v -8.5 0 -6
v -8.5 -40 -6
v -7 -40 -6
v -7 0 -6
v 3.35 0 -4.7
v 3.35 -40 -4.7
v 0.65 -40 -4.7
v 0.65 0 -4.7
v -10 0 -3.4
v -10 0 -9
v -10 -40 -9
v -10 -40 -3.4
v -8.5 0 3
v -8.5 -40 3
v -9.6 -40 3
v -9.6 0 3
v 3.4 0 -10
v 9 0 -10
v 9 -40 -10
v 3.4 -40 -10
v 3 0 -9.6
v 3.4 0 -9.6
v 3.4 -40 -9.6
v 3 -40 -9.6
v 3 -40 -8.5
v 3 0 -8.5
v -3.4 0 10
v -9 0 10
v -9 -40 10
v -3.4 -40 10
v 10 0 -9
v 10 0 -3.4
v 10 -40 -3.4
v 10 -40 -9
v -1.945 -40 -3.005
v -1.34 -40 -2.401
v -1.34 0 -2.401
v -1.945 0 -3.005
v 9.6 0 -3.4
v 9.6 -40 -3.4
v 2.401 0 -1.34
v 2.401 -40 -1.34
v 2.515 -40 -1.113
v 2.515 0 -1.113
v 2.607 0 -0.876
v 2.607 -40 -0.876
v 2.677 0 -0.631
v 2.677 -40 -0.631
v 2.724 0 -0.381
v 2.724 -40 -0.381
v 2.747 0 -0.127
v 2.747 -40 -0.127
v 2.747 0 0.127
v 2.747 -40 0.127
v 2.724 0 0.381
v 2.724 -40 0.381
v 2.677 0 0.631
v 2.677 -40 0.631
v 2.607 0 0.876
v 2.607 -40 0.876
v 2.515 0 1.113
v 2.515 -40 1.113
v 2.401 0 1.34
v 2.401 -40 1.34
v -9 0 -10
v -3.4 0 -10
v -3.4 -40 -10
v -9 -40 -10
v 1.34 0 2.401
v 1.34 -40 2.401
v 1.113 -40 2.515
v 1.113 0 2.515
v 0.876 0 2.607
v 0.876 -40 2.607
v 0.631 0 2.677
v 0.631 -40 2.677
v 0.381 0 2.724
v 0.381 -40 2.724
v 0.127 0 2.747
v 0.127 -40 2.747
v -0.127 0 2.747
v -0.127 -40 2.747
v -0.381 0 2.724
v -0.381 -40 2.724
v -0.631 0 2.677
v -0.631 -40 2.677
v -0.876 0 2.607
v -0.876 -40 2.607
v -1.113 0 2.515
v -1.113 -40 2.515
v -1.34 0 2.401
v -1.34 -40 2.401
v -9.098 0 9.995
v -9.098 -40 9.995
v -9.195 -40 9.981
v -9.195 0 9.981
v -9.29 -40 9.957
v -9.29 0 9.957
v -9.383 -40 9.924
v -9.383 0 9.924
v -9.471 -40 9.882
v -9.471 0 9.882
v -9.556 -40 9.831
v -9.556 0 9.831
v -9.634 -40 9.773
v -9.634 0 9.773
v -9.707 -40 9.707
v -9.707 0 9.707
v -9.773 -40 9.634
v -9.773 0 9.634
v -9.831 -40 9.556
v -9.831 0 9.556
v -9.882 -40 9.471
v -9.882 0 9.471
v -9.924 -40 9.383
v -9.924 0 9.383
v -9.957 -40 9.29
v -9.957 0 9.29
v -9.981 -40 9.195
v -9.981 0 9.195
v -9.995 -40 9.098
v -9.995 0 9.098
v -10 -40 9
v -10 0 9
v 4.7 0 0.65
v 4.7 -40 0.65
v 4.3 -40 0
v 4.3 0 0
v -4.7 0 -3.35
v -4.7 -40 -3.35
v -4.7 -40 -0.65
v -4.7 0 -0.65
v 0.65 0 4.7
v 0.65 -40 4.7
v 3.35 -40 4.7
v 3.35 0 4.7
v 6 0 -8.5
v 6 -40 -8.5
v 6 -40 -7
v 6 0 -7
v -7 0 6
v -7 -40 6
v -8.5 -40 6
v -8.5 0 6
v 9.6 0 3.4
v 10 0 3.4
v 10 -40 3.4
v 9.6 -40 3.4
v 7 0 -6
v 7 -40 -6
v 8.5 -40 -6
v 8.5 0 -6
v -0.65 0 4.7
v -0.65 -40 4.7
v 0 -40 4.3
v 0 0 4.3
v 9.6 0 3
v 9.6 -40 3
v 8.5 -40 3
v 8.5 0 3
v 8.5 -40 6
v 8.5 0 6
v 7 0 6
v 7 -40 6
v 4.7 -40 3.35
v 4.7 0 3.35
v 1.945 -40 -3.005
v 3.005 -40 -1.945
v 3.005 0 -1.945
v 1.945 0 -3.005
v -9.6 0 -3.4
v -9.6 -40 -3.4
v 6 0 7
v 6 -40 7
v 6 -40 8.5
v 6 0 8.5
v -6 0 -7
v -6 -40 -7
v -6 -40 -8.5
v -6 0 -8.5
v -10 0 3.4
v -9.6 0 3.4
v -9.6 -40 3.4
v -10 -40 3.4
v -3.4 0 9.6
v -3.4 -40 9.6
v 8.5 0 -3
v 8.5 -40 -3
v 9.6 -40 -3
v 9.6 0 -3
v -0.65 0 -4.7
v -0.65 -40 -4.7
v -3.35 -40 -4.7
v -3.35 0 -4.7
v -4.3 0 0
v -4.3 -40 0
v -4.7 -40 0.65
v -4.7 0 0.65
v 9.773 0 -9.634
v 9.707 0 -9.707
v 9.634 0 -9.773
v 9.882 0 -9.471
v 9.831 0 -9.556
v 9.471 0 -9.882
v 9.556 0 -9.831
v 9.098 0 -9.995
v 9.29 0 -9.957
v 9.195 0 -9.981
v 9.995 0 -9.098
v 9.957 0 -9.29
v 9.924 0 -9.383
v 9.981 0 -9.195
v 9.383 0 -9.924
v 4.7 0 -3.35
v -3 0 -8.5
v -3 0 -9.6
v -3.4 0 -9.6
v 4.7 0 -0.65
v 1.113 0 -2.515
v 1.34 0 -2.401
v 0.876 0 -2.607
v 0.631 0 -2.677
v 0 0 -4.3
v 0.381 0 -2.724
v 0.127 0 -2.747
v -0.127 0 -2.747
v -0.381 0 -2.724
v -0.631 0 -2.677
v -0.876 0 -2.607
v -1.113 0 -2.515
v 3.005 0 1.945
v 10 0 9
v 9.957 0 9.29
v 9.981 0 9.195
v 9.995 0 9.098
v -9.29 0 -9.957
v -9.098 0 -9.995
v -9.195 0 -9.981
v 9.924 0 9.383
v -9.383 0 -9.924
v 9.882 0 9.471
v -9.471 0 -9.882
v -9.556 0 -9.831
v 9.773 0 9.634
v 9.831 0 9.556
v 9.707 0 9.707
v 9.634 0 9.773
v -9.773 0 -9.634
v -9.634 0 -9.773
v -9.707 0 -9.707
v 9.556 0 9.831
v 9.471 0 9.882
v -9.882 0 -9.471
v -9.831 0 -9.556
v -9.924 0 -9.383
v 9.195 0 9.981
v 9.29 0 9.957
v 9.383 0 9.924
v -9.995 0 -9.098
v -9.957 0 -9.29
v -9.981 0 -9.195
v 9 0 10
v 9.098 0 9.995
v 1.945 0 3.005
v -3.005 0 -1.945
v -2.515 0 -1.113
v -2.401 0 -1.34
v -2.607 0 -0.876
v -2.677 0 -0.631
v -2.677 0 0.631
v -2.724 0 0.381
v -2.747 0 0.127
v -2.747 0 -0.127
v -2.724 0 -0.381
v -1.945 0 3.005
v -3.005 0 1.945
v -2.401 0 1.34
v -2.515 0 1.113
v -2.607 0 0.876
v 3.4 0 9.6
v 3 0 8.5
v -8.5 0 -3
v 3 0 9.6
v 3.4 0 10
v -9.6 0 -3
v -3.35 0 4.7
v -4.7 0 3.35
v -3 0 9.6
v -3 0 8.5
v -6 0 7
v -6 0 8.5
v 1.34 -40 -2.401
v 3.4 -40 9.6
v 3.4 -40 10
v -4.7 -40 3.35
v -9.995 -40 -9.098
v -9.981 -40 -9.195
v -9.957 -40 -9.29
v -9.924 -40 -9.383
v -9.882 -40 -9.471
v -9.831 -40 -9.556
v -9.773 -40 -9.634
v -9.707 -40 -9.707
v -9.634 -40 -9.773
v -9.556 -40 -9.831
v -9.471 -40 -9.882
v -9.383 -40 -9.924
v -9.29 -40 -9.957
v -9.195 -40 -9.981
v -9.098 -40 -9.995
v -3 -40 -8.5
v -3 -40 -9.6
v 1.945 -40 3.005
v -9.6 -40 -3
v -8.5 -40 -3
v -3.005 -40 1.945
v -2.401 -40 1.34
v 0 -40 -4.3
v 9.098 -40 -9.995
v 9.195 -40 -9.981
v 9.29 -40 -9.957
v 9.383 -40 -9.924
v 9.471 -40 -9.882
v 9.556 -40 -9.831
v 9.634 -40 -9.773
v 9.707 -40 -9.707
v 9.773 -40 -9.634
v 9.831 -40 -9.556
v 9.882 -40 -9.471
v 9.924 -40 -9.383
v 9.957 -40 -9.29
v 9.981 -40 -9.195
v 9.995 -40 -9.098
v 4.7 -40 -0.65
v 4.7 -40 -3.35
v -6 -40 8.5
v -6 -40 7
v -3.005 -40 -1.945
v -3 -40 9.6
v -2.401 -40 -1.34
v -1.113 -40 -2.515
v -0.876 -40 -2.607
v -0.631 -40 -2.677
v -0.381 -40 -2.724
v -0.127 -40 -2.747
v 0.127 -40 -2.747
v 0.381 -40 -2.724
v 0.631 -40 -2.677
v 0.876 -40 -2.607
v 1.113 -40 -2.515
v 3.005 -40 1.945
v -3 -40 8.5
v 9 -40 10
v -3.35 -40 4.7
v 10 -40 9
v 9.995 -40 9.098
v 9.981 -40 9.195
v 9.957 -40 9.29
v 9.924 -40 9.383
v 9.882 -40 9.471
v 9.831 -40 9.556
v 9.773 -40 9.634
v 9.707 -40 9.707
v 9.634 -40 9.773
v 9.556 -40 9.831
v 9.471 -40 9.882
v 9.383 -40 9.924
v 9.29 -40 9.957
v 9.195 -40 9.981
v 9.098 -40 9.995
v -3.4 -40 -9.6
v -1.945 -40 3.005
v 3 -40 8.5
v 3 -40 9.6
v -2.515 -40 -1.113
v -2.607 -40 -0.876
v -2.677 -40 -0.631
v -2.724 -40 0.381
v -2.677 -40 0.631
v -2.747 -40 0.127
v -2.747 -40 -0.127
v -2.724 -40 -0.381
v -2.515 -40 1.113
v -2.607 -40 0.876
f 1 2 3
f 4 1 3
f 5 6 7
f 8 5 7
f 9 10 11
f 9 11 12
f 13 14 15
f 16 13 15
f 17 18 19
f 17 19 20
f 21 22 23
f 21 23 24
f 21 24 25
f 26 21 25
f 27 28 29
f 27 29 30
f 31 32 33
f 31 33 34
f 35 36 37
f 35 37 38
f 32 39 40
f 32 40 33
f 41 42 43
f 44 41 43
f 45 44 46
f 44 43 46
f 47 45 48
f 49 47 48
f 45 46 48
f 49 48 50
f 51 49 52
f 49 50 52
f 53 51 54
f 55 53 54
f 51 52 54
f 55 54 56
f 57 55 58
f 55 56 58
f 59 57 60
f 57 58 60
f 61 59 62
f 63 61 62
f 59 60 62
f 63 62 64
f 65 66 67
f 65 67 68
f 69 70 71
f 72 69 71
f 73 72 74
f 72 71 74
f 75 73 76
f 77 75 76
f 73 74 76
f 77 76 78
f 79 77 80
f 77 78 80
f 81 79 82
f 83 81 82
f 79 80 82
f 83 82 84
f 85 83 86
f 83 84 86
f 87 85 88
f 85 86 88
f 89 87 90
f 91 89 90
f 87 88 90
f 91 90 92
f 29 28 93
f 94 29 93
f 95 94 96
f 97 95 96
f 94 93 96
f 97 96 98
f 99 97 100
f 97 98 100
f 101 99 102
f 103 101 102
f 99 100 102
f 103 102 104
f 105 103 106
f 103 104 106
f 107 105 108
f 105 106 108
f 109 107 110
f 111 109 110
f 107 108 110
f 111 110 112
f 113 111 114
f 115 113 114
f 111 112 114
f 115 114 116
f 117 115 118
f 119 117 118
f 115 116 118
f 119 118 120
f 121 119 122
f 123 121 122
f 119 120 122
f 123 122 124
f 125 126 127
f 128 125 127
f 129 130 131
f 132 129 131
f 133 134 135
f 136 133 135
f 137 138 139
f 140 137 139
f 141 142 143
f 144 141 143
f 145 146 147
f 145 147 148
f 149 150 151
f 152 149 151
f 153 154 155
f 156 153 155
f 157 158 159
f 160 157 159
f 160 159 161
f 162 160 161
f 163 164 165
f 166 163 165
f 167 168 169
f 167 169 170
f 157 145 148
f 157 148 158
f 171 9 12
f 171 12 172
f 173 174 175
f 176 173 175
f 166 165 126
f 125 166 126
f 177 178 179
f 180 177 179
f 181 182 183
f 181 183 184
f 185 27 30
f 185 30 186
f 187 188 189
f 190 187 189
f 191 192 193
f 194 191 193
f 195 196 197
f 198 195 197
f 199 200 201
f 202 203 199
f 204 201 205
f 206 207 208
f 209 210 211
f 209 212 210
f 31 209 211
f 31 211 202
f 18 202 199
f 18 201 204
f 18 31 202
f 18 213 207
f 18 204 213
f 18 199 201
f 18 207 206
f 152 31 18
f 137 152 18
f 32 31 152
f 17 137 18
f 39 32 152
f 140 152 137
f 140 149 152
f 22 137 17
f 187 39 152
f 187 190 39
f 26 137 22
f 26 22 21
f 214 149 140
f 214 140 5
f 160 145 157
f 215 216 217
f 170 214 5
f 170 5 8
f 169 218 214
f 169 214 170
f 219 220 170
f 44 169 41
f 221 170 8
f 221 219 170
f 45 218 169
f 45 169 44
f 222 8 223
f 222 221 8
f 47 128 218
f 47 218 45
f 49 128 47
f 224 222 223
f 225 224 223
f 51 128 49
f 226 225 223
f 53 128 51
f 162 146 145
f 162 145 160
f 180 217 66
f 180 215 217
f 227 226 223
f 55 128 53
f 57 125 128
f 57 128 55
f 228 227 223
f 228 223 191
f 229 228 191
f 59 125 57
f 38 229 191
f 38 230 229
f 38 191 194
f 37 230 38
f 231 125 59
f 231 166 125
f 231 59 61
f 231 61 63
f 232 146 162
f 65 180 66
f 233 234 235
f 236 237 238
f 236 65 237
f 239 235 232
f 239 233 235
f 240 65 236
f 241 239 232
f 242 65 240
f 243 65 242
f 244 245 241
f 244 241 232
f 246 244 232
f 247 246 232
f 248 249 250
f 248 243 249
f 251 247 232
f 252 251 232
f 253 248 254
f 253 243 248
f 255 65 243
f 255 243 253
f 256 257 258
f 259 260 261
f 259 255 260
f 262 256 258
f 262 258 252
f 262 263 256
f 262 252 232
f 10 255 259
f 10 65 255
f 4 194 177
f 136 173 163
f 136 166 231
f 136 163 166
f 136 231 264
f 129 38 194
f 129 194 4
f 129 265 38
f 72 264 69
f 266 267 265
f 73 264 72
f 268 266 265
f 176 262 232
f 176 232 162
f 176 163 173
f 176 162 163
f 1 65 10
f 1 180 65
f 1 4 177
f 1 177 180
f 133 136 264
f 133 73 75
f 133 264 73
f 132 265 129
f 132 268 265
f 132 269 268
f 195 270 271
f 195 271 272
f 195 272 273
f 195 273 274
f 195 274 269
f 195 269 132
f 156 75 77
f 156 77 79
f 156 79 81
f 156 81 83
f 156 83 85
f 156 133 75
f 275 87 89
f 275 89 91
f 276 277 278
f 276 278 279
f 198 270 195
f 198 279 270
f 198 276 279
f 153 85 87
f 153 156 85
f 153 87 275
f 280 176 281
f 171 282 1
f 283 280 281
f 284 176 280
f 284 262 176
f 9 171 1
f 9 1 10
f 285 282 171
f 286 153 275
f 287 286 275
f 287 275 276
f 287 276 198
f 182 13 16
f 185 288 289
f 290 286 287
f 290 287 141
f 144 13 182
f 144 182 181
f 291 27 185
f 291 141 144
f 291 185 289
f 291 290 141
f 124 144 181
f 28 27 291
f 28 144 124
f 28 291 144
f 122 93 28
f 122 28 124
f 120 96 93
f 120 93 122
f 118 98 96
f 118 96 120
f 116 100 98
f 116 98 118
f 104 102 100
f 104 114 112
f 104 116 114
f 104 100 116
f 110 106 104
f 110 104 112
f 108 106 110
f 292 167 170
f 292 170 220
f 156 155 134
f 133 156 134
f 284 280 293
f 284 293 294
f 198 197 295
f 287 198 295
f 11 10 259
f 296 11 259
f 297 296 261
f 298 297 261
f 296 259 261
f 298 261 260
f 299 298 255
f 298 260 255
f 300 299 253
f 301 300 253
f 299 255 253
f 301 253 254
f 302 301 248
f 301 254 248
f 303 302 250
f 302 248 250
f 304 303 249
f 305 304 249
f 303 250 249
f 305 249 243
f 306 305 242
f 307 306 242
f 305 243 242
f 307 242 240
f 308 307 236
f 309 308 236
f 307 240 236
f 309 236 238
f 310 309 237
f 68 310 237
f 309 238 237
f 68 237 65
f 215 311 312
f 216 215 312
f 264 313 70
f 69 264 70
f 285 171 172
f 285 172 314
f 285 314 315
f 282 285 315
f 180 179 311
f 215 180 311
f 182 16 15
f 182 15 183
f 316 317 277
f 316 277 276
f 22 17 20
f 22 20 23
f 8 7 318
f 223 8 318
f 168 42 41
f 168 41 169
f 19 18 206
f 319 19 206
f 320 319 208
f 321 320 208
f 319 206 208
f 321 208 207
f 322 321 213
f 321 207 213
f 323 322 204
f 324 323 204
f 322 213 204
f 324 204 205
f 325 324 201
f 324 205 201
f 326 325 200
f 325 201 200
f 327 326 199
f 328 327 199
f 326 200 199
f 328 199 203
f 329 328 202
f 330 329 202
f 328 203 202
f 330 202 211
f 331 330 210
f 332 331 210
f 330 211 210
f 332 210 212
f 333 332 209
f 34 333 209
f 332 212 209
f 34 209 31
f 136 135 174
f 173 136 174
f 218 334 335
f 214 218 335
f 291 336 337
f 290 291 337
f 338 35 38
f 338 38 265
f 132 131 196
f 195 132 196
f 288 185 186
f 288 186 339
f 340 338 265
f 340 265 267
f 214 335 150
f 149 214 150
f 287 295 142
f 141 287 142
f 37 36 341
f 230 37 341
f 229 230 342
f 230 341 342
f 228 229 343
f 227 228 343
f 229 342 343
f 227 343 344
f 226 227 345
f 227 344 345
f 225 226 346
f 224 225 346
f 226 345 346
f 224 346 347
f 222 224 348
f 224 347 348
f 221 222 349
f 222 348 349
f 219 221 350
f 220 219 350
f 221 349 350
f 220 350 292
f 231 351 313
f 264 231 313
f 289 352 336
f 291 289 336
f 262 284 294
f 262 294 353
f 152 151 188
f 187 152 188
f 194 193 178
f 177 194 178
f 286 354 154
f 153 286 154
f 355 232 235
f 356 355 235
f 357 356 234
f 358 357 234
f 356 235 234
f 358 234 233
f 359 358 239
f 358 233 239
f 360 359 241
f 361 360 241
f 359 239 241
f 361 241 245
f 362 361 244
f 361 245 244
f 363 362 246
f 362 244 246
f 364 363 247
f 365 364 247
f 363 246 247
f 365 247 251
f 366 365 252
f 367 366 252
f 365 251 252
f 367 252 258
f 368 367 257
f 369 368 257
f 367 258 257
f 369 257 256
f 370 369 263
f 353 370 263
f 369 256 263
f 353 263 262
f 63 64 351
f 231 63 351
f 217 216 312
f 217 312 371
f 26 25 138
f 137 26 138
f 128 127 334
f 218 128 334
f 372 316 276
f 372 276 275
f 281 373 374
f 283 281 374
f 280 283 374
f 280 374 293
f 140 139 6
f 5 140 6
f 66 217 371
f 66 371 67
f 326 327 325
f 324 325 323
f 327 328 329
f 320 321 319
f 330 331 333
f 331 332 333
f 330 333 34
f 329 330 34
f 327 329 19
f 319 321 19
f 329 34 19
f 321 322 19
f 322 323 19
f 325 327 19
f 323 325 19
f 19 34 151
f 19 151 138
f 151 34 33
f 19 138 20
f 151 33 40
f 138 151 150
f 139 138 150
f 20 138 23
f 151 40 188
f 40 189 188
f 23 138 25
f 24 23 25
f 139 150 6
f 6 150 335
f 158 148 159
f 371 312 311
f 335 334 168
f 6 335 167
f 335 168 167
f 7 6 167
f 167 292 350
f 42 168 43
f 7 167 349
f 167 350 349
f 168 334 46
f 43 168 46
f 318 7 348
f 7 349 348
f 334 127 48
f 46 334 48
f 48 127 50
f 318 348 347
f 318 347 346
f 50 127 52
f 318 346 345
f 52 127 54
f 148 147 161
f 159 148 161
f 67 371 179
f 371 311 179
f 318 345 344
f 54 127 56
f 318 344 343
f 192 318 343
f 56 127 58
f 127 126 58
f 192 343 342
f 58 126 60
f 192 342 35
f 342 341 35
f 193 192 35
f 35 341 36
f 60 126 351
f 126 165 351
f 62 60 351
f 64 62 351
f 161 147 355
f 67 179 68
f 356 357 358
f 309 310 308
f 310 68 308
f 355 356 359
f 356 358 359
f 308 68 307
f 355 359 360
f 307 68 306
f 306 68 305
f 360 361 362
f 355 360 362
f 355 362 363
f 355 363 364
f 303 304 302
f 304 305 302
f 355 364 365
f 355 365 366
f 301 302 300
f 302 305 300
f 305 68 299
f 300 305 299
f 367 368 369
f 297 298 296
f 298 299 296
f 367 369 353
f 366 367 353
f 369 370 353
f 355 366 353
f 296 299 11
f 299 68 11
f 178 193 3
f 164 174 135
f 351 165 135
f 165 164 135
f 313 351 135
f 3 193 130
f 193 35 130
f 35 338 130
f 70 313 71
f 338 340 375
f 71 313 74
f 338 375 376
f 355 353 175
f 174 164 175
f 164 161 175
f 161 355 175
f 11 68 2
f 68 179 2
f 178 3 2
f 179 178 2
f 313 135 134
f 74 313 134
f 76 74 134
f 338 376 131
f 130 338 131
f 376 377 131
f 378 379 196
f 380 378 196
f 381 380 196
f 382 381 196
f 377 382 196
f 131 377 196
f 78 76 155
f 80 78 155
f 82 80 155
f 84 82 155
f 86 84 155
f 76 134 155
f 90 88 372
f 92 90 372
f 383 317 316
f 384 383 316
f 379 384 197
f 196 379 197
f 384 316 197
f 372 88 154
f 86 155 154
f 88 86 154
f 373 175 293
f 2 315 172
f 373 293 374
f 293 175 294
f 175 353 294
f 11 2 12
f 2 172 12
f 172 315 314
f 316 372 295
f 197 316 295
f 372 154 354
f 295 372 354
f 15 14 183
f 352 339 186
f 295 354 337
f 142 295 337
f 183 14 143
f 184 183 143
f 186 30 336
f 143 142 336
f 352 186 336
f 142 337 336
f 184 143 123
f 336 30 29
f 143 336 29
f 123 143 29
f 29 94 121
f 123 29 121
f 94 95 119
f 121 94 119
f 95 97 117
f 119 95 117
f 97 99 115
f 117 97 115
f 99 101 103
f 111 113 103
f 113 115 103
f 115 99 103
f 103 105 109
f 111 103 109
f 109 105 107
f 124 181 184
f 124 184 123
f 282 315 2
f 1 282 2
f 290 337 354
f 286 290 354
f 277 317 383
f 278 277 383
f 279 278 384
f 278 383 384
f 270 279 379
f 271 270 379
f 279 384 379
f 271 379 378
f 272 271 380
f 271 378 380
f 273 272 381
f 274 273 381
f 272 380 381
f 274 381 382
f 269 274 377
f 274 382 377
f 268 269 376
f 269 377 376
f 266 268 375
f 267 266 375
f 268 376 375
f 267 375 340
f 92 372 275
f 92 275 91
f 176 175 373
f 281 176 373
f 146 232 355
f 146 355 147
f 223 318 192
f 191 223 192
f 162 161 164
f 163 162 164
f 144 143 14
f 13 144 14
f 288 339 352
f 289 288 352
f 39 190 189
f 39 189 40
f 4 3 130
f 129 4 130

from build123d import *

# Parameters (mm, degrees)
PAD_DEPTH          = 40
POCKET_DEPTH       = 380
POLARPATTERN_COUNT = 4
POCKET001_DEPTH    = 380


with BuildPart() as part:
    # Sketch → Pad (new body)
    with BuildSketch(Plane.XZ):
        with BuildLine():
            Line((-9, 10), (9, 10))
            ThreePointArc((10, 9), (9.707107, 9.707107), (9, 10))
            Line((10, 9), (10, -9))
            ThreePointArc((9, -10), (9.707107, -9.707107), (10, -9))
            Line((9, -10), (-9, -10))
            ThreePointArc((-10, -9), (-9.707107, -9.707107), (-9, -10))
            Line((-10, -9), (-10, 9))
            ThreePointArc((-9, 10), (-9.707107, 9.707107), (-10, 9))
        make_face()
    extrude(amount=PAD_DEPTH)

    # Sketch001 (on Face10 of Pad) → Pocket (cut)
    with BuildSketch(Plane.XZ.offset(40)):
        Polygon((-3.4, 10), (-3.4, 9.6), (-3, 9.6), (-3, 8.5), (-6, 8.5), (-6, 7), (-3.35, 4.7), (-0.65, 4.7), (0, 4.3), (0.65, 4.7), (3.35, 4.7), (6, 7), (6, 8.5), (3, 8.5), (3, 9.6), (3.4, 9.6), (3.4, 10), align=None)
    pocket = extrude(amount=-POCKET_DEPTH, mode=Mode.SUBTRACT)

    # PolarPattern: Pocket ×4 about axis
    polarpattern_axis = Axis((0, -40, 0), (0, -1, 0))
    for i in range(1, POLARPATTERN_COUNT):
        add(pocket.rotate(polarpattern_axis, i * 360 / POLARPATTERN_COUNT), mode=Mode.SUBTRACT)

    # Sketch002 (on Face4 of PolarPattern) → Pocket001 (cut)
    with BuildSketch(Plane.XZ.offset(40)):
        with BuildLine():
            ThreePointArc((1.340499, 2.401159), (0, 2.75), (-1.340499, 2.401159))
            Line((-1.944544, 3.005204), (-1.340499, 2.401159))
            Line((-3.005204, 1.944544), (-1.944544, 3.005204))
            Line((-2.401159, 1.340499), (-3.005204, 1.944544))
            ThreePointArc((-2.401159, 1.340499), (-2.75, 0), (-2.401159, -1.340499))
            Line((-3.005204, -1.944544), (-2.401159, -1.340499))
            Line((-1.944544, -3.005204), (-3.005204, -1.944544))
            Line((-1.340499, -2.401159), (-1.944544, -3.005204))
            ThreePointArc((-1.340499, -2.401159), (0, -2.75), (1.340499, -2.401159))
            Line((1.944544, -3.005204), (1.340499, -2.401159))
            Line((3.005204, -1.944544), (1.944544, -3.005204))
            Line((2.401159, -1.340499), (3.005204, -1.944544))
            ThreePointArc((2.401159, -1.340499), (2.75, 0), (2.401159, 1.340499))
            Line((2.401159, 1.340499), (3.005204, 1.944544))
            Line((3.005204, 1.944544), (1.944544, 3.005204))
            Line((1.944544, 3.005204), (1.340499, 2.401159))
        make_face()
    extrude(amount=-POCKET001_DEPTH, mode=Mode.SUBTRACT)


solid = part.part
